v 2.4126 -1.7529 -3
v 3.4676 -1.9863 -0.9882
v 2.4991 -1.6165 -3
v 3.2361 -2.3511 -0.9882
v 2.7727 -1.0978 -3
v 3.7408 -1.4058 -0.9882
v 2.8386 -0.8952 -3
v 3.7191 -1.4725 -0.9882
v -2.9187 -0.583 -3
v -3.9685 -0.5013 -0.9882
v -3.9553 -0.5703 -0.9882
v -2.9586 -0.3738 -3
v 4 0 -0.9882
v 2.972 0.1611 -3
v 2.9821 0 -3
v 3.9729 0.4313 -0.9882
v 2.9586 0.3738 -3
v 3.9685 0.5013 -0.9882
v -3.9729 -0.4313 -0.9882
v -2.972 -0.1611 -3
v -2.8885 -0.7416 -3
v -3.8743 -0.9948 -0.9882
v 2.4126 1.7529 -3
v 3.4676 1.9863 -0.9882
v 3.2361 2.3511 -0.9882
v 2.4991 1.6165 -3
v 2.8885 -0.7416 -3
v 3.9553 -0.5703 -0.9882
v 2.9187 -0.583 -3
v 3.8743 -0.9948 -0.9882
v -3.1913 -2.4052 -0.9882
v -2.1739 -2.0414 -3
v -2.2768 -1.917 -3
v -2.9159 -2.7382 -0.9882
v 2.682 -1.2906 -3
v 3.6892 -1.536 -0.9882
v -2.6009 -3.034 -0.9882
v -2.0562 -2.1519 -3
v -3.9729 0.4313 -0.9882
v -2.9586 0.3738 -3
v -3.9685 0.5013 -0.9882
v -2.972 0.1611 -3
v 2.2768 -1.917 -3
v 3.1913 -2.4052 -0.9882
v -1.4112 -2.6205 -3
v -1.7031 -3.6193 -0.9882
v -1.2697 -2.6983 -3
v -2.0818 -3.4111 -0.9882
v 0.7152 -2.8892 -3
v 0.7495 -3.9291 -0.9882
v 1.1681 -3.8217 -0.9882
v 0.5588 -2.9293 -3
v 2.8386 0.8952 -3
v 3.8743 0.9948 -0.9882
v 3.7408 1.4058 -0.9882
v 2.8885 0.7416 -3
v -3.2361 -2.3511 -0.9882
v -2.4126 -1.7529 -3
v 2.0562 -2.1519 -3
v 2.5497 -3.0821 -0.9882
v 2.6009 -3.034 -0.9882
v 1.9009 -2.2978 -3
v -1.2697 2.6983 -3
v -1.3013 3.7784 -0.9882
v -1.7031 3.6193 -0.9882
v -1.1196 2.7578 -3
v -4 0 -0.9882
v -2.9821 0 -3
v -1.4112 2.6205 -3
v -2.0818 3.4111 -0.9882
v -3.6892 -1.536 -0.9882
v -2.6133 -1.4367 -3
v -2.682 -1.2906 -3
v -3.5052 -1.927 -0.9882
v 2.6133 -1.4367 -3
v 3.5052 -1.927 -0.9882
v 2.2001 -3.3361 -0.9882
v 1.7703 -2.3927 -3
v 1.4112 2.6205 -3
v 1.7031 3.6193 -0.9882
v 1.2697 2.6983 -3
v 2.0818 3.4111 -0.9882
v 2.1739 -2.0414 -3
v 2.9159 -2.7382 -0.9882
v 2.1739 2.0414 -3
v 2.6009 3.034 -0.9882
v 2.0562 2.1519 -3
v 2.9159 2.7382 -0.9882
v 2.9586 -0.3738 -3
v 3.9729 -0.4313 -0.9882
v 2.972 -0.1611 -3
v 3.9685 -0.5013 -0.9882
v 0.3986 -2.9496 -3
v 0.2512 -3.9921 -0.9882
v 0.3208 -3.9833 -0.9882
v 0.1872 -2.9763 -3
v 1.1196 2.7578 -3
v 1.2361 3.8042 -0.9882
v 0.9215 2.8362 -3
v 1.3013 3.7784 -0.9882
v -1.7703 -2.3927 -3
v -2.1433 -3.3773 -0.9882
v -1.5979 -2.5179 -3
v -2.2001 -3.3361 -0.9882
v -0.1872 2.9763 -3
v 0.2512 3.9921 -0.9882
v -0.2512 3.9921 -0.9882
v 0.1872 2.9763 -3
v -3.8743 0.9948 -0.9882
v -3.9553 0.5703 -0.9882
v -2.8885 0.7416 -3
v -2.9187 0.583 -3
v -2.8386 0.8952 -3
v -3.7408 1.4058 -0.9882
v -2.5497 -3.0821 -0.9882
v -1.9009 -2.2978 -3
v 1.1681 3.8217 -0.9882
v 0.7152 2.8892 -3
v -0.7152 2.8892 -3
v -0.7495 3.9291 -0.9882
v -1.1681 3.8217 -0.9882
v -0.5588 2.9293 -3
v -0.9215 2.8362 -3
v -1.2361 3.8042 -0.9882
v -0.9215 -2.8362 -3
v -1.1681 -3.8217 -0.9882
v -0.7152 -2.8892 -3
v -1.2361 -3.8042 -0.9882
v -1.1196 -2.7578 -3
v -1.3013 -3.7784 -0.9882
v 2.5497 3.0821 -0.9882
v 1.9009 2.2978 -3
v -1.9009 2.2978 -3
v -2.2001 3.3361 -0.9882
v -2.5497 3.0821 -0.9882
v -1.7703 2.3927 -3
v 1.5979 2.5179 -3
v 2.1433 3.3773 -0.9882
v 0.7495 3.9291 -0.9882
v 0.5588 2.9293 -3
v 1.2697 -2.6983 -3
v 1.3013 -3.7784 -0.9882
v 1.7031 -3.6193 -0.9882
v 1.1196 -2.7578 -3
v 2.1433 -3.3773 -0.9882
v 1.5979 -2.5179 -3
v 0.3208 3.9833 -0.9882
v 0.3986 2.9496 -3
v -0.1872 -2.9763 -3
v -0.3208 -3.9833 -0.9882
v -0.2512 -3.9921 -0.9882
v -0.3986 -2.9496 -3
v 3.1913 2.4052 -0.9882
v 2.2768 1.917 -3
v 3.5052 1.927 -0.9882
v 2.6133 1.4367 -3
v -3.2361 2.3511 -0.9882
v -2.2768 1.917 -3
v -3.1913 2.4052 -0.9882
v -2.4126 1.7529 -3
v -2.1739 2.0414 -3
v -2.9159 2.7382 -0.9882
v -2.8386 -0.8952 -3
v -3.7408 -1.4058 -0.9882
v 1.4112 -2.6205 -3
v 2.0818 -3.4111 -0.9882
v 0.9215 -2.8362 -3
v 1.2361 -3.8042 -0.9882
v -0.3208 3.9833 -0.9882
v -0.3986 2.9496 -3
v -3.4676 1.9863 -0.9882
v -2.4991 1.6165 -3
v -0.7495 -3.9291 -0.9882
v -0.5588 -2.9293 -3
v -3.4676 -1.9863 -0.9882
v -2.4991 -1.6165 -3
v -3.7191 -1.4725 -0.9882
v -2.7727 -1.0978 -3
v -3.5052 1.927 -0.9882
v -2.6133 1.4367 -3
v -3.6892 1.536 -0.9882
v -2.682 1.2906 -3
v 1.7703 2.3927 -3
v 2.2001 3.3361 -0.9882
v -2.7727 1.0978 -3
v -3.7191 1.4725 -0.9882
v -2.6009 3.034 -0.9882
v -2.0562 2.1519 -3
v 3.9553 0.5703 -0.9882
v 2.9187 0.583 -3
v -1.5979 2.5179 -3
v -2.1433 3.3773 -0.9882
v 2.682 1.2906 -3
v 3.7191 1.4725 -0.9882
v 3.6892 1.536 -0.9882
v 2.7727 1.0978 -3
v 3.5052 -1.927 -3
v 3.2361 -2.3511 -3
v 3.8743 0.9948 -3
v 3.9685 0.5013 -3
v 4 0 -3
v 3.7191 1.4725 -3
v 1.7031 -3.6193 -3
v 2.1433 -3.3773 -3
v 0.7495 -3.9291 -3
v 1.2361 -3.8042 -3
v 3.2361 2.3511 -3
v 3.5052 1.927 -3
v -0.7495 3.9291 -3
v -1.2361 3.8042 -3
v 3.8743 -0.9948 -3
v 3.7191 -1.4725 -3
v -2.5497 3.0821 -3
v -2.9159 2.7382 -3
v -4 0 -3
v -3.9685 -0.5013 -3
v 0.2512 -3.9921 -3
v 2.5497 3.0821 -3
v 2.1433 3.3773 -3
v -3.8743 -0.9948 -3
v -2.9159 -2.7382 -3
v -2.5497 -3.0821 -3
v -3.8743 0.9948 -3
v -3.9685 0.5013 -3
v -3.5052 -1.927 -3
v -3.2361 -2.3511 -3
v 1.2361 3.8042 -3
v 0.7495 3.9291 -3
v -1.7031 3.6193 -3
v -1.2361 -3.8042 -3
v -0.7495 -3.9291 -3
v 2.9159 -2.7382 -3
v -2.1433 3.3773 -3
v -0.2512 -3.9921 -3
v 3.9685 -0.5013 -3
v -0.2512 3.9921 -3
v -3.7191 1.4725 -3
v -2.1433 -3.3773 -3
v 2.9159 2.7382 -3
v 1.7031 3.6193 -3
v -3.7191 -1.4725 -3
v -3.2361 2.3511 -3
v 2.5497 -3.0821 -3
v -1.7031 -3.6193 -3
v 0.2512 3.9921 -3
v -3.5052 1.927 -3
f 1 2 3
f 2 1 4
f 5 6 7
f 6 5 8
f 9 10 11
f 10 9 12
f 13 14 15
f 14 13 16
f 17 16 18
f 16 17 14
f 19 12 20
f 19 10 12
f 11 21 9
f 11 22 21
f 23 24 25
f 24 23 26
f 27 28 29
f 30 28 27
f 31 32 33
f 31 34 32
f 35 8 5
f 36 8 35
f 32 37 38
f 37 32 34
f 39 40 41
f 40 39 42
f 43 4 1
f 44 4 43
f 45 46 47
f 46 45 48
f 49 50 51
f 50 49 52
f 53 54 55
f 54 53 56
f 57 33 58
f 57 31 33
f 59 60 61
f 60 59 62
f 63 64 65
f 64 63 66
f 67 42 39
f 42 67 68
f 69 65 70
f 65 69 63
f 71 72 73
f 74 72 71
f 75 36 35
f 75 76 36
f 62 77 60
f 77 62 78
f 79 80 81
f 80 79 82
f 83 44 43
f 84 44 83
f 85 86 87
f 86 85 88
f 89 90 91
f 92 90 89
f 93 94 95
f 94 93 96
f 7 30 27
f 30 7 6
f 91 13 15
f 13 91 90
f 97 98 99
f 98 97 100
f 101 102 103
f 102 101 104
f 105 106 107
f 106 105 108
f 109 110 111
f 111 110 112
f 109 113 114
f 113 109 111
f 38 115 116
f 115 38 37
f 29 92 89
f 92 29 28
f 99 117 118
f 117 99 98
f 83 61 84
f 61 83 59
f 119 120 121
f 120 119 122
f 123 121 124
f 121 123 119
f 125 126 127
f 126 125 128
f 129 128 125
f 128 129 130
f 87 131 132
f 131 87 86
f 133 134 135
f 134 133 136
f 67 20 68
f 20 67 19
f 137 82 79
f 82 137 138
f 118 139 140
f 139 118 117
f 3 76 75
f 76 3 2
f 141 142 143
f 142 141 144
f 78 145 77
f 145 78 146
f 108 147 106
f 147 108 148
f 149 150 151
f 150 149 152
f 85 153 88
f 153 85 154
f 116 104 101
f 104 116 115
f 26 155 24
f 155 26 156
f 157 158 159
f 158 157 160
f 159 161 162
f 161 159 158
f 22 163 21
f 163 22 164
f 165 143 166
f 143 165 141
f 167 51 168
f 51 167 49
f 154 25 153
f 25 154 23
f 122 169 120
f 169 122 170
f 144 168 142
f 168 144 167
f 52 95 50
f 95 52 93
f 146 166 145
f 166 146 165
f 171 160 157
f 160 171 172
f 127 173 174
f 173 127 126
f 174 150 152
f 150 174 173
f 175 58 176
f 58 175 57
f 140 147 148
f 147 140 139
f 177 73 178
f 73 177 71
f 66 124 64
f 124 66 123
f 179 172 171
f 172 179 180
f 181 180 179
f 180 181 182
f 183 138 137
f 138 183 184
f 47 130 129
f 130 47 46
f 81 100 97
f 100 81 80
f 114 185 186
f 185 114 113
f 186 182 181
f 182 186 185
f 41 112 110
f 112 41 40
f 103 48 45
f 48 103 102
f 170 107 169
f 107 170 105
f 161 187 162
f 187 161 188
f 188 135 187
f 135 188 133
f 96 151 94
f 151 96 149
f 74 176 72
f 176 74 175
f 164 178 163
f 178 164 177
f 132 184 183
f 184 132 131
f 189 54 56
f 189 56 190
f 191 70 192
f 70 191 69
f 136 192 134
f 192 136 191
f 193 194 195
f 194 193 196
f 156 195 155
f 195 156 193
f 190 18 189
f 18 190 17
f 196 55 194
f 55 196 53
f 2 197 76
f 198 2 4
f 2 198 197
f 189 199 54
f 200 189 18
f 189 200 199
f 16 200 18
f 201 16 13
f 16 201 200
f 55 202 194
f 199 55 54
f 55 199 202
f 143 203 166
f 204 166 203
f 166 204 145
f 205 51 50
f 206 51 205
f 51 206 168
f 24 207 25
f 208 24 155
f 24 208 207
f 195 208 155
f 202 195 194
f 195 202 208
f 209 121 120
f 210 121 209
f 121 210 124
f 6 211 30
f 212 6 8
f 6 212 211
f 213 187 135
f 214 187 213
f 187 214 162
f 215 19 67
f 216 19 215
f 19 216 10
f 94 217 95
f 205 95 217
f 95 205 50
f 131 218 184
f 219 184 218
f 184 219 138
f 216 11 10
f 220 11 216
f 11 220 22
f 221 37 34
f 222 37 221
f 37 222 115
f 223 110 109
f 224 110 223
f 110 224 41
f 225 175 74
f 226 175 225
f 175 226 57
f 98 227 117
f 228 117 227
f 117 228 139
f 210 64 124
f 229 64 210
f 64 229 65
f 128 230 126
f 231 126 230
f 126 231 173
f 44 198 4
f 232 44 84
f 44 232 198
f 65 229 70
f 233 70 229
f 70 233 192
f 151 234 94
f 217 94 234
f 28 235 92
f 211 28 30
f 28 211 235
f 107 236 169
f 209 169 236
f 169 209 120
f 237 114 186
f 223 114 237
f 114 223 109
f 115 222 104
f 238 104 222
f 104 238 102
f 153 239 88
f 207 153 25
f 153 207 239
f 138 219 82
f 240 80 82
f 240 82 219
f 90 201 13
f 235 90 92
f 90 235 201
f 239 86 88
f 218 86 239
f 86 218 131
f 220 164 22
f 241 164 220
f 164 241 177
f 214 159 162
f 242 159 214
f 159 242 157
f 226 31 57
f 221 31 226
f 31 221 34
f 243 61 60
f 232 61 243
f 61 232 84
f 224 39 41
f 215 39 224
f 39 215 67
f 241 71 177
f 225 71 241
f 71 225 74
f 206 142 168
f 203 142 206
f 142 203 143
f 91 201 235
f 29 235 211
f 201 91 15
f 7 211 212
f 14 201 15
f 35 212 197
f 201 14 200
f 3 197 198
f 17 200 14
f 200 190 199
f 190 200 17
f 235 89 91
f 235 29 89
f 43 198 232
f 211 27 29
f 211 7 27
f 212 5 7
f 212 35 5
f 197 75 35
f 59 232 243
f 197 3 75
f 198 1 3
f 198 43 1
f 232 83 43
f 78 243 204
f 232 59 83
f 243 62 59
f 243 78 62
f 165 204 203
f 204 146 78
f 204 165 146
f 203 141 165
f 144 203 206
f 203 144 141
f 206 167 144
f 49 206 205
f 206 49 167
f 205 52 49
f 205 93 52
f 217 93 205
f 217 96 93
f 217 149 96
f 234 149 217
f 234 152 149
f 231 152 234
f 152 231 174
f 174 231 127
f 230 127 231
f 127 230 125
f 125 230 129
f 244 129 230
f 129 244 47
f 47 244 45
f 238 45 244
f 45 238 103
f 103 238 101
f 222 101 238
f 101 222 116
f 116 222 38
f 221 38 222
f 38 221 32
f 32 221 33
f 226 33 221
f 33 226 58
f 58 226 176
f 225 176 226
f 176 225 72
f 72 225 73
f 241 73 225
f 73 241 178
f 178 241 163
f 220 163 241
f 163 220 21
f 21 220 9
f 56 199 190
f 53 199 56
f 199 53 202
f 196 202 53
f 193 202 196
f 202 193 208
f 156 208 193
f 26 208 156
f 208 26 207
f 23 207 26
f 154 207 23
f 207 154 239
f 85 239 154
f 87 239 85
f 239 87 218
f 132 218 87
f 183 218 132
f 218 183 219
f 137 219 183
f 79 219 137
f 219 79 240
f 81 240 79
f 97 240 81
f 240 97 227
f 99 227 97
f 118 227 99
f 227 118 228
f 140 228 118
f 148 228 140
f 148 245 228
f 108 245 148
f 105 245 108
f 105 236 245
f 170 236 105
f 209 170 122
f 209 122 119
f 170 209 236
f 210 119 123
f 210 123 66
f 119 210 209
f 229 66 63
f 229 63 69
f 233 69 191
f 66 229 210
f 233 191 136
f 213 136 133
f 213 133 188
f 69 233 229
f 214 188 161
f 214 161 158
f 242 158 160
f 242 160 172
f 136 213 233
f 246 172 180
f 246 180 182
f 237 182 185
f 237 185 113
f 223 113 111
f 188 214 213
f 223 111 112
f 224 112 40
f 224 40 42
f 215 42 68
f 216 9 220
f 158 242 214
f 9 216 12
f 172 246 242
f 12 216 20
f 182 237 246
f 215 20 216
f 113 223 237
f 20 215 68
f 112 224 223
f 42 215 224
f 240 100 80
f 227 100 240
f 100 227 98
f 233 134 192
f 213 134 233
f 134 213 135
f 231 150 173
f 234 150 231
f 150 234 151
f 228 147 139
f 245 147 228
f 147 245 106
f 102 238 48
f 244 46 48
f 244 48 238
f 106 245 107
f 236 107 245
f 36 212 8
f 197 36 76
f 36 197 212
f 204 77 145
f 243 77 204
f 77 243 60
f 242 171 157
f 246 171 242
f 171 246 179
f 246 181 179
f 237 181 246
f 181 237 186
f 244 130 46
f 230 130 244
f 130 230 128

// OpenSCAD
$fn = 50;

difference() {
	union() {
		translate(v = [0, 0, -3.0]) {
			cylinder(h = 6, r = 4.0);
		}
	}
	union() {
		translate(v = [0, 0, 0]) {
			rotate(a = [0, 0, 0]) {
				difference() {
					union() {
						translate(v = [0, 0, -6.0]) {
							cylinder(h = 6, r = 2.25);
						}
						translate(v = [0, 0, -4.2]) {
							cylinder(h = 4.2, r1 = 2.375, r2 = 4.5);
						}
						translate(v = [0, 0, -6.0]) {
							cylinder(h = 6, r = 2.375);
						}
						translate(v = [0, 0, -6.0]) {
							cylinder(h = 6, r = 2.25);
						}
					}
					union();
				}
			}
		}
		#cylinder(h = 3, r = 5.0);
	}
}
